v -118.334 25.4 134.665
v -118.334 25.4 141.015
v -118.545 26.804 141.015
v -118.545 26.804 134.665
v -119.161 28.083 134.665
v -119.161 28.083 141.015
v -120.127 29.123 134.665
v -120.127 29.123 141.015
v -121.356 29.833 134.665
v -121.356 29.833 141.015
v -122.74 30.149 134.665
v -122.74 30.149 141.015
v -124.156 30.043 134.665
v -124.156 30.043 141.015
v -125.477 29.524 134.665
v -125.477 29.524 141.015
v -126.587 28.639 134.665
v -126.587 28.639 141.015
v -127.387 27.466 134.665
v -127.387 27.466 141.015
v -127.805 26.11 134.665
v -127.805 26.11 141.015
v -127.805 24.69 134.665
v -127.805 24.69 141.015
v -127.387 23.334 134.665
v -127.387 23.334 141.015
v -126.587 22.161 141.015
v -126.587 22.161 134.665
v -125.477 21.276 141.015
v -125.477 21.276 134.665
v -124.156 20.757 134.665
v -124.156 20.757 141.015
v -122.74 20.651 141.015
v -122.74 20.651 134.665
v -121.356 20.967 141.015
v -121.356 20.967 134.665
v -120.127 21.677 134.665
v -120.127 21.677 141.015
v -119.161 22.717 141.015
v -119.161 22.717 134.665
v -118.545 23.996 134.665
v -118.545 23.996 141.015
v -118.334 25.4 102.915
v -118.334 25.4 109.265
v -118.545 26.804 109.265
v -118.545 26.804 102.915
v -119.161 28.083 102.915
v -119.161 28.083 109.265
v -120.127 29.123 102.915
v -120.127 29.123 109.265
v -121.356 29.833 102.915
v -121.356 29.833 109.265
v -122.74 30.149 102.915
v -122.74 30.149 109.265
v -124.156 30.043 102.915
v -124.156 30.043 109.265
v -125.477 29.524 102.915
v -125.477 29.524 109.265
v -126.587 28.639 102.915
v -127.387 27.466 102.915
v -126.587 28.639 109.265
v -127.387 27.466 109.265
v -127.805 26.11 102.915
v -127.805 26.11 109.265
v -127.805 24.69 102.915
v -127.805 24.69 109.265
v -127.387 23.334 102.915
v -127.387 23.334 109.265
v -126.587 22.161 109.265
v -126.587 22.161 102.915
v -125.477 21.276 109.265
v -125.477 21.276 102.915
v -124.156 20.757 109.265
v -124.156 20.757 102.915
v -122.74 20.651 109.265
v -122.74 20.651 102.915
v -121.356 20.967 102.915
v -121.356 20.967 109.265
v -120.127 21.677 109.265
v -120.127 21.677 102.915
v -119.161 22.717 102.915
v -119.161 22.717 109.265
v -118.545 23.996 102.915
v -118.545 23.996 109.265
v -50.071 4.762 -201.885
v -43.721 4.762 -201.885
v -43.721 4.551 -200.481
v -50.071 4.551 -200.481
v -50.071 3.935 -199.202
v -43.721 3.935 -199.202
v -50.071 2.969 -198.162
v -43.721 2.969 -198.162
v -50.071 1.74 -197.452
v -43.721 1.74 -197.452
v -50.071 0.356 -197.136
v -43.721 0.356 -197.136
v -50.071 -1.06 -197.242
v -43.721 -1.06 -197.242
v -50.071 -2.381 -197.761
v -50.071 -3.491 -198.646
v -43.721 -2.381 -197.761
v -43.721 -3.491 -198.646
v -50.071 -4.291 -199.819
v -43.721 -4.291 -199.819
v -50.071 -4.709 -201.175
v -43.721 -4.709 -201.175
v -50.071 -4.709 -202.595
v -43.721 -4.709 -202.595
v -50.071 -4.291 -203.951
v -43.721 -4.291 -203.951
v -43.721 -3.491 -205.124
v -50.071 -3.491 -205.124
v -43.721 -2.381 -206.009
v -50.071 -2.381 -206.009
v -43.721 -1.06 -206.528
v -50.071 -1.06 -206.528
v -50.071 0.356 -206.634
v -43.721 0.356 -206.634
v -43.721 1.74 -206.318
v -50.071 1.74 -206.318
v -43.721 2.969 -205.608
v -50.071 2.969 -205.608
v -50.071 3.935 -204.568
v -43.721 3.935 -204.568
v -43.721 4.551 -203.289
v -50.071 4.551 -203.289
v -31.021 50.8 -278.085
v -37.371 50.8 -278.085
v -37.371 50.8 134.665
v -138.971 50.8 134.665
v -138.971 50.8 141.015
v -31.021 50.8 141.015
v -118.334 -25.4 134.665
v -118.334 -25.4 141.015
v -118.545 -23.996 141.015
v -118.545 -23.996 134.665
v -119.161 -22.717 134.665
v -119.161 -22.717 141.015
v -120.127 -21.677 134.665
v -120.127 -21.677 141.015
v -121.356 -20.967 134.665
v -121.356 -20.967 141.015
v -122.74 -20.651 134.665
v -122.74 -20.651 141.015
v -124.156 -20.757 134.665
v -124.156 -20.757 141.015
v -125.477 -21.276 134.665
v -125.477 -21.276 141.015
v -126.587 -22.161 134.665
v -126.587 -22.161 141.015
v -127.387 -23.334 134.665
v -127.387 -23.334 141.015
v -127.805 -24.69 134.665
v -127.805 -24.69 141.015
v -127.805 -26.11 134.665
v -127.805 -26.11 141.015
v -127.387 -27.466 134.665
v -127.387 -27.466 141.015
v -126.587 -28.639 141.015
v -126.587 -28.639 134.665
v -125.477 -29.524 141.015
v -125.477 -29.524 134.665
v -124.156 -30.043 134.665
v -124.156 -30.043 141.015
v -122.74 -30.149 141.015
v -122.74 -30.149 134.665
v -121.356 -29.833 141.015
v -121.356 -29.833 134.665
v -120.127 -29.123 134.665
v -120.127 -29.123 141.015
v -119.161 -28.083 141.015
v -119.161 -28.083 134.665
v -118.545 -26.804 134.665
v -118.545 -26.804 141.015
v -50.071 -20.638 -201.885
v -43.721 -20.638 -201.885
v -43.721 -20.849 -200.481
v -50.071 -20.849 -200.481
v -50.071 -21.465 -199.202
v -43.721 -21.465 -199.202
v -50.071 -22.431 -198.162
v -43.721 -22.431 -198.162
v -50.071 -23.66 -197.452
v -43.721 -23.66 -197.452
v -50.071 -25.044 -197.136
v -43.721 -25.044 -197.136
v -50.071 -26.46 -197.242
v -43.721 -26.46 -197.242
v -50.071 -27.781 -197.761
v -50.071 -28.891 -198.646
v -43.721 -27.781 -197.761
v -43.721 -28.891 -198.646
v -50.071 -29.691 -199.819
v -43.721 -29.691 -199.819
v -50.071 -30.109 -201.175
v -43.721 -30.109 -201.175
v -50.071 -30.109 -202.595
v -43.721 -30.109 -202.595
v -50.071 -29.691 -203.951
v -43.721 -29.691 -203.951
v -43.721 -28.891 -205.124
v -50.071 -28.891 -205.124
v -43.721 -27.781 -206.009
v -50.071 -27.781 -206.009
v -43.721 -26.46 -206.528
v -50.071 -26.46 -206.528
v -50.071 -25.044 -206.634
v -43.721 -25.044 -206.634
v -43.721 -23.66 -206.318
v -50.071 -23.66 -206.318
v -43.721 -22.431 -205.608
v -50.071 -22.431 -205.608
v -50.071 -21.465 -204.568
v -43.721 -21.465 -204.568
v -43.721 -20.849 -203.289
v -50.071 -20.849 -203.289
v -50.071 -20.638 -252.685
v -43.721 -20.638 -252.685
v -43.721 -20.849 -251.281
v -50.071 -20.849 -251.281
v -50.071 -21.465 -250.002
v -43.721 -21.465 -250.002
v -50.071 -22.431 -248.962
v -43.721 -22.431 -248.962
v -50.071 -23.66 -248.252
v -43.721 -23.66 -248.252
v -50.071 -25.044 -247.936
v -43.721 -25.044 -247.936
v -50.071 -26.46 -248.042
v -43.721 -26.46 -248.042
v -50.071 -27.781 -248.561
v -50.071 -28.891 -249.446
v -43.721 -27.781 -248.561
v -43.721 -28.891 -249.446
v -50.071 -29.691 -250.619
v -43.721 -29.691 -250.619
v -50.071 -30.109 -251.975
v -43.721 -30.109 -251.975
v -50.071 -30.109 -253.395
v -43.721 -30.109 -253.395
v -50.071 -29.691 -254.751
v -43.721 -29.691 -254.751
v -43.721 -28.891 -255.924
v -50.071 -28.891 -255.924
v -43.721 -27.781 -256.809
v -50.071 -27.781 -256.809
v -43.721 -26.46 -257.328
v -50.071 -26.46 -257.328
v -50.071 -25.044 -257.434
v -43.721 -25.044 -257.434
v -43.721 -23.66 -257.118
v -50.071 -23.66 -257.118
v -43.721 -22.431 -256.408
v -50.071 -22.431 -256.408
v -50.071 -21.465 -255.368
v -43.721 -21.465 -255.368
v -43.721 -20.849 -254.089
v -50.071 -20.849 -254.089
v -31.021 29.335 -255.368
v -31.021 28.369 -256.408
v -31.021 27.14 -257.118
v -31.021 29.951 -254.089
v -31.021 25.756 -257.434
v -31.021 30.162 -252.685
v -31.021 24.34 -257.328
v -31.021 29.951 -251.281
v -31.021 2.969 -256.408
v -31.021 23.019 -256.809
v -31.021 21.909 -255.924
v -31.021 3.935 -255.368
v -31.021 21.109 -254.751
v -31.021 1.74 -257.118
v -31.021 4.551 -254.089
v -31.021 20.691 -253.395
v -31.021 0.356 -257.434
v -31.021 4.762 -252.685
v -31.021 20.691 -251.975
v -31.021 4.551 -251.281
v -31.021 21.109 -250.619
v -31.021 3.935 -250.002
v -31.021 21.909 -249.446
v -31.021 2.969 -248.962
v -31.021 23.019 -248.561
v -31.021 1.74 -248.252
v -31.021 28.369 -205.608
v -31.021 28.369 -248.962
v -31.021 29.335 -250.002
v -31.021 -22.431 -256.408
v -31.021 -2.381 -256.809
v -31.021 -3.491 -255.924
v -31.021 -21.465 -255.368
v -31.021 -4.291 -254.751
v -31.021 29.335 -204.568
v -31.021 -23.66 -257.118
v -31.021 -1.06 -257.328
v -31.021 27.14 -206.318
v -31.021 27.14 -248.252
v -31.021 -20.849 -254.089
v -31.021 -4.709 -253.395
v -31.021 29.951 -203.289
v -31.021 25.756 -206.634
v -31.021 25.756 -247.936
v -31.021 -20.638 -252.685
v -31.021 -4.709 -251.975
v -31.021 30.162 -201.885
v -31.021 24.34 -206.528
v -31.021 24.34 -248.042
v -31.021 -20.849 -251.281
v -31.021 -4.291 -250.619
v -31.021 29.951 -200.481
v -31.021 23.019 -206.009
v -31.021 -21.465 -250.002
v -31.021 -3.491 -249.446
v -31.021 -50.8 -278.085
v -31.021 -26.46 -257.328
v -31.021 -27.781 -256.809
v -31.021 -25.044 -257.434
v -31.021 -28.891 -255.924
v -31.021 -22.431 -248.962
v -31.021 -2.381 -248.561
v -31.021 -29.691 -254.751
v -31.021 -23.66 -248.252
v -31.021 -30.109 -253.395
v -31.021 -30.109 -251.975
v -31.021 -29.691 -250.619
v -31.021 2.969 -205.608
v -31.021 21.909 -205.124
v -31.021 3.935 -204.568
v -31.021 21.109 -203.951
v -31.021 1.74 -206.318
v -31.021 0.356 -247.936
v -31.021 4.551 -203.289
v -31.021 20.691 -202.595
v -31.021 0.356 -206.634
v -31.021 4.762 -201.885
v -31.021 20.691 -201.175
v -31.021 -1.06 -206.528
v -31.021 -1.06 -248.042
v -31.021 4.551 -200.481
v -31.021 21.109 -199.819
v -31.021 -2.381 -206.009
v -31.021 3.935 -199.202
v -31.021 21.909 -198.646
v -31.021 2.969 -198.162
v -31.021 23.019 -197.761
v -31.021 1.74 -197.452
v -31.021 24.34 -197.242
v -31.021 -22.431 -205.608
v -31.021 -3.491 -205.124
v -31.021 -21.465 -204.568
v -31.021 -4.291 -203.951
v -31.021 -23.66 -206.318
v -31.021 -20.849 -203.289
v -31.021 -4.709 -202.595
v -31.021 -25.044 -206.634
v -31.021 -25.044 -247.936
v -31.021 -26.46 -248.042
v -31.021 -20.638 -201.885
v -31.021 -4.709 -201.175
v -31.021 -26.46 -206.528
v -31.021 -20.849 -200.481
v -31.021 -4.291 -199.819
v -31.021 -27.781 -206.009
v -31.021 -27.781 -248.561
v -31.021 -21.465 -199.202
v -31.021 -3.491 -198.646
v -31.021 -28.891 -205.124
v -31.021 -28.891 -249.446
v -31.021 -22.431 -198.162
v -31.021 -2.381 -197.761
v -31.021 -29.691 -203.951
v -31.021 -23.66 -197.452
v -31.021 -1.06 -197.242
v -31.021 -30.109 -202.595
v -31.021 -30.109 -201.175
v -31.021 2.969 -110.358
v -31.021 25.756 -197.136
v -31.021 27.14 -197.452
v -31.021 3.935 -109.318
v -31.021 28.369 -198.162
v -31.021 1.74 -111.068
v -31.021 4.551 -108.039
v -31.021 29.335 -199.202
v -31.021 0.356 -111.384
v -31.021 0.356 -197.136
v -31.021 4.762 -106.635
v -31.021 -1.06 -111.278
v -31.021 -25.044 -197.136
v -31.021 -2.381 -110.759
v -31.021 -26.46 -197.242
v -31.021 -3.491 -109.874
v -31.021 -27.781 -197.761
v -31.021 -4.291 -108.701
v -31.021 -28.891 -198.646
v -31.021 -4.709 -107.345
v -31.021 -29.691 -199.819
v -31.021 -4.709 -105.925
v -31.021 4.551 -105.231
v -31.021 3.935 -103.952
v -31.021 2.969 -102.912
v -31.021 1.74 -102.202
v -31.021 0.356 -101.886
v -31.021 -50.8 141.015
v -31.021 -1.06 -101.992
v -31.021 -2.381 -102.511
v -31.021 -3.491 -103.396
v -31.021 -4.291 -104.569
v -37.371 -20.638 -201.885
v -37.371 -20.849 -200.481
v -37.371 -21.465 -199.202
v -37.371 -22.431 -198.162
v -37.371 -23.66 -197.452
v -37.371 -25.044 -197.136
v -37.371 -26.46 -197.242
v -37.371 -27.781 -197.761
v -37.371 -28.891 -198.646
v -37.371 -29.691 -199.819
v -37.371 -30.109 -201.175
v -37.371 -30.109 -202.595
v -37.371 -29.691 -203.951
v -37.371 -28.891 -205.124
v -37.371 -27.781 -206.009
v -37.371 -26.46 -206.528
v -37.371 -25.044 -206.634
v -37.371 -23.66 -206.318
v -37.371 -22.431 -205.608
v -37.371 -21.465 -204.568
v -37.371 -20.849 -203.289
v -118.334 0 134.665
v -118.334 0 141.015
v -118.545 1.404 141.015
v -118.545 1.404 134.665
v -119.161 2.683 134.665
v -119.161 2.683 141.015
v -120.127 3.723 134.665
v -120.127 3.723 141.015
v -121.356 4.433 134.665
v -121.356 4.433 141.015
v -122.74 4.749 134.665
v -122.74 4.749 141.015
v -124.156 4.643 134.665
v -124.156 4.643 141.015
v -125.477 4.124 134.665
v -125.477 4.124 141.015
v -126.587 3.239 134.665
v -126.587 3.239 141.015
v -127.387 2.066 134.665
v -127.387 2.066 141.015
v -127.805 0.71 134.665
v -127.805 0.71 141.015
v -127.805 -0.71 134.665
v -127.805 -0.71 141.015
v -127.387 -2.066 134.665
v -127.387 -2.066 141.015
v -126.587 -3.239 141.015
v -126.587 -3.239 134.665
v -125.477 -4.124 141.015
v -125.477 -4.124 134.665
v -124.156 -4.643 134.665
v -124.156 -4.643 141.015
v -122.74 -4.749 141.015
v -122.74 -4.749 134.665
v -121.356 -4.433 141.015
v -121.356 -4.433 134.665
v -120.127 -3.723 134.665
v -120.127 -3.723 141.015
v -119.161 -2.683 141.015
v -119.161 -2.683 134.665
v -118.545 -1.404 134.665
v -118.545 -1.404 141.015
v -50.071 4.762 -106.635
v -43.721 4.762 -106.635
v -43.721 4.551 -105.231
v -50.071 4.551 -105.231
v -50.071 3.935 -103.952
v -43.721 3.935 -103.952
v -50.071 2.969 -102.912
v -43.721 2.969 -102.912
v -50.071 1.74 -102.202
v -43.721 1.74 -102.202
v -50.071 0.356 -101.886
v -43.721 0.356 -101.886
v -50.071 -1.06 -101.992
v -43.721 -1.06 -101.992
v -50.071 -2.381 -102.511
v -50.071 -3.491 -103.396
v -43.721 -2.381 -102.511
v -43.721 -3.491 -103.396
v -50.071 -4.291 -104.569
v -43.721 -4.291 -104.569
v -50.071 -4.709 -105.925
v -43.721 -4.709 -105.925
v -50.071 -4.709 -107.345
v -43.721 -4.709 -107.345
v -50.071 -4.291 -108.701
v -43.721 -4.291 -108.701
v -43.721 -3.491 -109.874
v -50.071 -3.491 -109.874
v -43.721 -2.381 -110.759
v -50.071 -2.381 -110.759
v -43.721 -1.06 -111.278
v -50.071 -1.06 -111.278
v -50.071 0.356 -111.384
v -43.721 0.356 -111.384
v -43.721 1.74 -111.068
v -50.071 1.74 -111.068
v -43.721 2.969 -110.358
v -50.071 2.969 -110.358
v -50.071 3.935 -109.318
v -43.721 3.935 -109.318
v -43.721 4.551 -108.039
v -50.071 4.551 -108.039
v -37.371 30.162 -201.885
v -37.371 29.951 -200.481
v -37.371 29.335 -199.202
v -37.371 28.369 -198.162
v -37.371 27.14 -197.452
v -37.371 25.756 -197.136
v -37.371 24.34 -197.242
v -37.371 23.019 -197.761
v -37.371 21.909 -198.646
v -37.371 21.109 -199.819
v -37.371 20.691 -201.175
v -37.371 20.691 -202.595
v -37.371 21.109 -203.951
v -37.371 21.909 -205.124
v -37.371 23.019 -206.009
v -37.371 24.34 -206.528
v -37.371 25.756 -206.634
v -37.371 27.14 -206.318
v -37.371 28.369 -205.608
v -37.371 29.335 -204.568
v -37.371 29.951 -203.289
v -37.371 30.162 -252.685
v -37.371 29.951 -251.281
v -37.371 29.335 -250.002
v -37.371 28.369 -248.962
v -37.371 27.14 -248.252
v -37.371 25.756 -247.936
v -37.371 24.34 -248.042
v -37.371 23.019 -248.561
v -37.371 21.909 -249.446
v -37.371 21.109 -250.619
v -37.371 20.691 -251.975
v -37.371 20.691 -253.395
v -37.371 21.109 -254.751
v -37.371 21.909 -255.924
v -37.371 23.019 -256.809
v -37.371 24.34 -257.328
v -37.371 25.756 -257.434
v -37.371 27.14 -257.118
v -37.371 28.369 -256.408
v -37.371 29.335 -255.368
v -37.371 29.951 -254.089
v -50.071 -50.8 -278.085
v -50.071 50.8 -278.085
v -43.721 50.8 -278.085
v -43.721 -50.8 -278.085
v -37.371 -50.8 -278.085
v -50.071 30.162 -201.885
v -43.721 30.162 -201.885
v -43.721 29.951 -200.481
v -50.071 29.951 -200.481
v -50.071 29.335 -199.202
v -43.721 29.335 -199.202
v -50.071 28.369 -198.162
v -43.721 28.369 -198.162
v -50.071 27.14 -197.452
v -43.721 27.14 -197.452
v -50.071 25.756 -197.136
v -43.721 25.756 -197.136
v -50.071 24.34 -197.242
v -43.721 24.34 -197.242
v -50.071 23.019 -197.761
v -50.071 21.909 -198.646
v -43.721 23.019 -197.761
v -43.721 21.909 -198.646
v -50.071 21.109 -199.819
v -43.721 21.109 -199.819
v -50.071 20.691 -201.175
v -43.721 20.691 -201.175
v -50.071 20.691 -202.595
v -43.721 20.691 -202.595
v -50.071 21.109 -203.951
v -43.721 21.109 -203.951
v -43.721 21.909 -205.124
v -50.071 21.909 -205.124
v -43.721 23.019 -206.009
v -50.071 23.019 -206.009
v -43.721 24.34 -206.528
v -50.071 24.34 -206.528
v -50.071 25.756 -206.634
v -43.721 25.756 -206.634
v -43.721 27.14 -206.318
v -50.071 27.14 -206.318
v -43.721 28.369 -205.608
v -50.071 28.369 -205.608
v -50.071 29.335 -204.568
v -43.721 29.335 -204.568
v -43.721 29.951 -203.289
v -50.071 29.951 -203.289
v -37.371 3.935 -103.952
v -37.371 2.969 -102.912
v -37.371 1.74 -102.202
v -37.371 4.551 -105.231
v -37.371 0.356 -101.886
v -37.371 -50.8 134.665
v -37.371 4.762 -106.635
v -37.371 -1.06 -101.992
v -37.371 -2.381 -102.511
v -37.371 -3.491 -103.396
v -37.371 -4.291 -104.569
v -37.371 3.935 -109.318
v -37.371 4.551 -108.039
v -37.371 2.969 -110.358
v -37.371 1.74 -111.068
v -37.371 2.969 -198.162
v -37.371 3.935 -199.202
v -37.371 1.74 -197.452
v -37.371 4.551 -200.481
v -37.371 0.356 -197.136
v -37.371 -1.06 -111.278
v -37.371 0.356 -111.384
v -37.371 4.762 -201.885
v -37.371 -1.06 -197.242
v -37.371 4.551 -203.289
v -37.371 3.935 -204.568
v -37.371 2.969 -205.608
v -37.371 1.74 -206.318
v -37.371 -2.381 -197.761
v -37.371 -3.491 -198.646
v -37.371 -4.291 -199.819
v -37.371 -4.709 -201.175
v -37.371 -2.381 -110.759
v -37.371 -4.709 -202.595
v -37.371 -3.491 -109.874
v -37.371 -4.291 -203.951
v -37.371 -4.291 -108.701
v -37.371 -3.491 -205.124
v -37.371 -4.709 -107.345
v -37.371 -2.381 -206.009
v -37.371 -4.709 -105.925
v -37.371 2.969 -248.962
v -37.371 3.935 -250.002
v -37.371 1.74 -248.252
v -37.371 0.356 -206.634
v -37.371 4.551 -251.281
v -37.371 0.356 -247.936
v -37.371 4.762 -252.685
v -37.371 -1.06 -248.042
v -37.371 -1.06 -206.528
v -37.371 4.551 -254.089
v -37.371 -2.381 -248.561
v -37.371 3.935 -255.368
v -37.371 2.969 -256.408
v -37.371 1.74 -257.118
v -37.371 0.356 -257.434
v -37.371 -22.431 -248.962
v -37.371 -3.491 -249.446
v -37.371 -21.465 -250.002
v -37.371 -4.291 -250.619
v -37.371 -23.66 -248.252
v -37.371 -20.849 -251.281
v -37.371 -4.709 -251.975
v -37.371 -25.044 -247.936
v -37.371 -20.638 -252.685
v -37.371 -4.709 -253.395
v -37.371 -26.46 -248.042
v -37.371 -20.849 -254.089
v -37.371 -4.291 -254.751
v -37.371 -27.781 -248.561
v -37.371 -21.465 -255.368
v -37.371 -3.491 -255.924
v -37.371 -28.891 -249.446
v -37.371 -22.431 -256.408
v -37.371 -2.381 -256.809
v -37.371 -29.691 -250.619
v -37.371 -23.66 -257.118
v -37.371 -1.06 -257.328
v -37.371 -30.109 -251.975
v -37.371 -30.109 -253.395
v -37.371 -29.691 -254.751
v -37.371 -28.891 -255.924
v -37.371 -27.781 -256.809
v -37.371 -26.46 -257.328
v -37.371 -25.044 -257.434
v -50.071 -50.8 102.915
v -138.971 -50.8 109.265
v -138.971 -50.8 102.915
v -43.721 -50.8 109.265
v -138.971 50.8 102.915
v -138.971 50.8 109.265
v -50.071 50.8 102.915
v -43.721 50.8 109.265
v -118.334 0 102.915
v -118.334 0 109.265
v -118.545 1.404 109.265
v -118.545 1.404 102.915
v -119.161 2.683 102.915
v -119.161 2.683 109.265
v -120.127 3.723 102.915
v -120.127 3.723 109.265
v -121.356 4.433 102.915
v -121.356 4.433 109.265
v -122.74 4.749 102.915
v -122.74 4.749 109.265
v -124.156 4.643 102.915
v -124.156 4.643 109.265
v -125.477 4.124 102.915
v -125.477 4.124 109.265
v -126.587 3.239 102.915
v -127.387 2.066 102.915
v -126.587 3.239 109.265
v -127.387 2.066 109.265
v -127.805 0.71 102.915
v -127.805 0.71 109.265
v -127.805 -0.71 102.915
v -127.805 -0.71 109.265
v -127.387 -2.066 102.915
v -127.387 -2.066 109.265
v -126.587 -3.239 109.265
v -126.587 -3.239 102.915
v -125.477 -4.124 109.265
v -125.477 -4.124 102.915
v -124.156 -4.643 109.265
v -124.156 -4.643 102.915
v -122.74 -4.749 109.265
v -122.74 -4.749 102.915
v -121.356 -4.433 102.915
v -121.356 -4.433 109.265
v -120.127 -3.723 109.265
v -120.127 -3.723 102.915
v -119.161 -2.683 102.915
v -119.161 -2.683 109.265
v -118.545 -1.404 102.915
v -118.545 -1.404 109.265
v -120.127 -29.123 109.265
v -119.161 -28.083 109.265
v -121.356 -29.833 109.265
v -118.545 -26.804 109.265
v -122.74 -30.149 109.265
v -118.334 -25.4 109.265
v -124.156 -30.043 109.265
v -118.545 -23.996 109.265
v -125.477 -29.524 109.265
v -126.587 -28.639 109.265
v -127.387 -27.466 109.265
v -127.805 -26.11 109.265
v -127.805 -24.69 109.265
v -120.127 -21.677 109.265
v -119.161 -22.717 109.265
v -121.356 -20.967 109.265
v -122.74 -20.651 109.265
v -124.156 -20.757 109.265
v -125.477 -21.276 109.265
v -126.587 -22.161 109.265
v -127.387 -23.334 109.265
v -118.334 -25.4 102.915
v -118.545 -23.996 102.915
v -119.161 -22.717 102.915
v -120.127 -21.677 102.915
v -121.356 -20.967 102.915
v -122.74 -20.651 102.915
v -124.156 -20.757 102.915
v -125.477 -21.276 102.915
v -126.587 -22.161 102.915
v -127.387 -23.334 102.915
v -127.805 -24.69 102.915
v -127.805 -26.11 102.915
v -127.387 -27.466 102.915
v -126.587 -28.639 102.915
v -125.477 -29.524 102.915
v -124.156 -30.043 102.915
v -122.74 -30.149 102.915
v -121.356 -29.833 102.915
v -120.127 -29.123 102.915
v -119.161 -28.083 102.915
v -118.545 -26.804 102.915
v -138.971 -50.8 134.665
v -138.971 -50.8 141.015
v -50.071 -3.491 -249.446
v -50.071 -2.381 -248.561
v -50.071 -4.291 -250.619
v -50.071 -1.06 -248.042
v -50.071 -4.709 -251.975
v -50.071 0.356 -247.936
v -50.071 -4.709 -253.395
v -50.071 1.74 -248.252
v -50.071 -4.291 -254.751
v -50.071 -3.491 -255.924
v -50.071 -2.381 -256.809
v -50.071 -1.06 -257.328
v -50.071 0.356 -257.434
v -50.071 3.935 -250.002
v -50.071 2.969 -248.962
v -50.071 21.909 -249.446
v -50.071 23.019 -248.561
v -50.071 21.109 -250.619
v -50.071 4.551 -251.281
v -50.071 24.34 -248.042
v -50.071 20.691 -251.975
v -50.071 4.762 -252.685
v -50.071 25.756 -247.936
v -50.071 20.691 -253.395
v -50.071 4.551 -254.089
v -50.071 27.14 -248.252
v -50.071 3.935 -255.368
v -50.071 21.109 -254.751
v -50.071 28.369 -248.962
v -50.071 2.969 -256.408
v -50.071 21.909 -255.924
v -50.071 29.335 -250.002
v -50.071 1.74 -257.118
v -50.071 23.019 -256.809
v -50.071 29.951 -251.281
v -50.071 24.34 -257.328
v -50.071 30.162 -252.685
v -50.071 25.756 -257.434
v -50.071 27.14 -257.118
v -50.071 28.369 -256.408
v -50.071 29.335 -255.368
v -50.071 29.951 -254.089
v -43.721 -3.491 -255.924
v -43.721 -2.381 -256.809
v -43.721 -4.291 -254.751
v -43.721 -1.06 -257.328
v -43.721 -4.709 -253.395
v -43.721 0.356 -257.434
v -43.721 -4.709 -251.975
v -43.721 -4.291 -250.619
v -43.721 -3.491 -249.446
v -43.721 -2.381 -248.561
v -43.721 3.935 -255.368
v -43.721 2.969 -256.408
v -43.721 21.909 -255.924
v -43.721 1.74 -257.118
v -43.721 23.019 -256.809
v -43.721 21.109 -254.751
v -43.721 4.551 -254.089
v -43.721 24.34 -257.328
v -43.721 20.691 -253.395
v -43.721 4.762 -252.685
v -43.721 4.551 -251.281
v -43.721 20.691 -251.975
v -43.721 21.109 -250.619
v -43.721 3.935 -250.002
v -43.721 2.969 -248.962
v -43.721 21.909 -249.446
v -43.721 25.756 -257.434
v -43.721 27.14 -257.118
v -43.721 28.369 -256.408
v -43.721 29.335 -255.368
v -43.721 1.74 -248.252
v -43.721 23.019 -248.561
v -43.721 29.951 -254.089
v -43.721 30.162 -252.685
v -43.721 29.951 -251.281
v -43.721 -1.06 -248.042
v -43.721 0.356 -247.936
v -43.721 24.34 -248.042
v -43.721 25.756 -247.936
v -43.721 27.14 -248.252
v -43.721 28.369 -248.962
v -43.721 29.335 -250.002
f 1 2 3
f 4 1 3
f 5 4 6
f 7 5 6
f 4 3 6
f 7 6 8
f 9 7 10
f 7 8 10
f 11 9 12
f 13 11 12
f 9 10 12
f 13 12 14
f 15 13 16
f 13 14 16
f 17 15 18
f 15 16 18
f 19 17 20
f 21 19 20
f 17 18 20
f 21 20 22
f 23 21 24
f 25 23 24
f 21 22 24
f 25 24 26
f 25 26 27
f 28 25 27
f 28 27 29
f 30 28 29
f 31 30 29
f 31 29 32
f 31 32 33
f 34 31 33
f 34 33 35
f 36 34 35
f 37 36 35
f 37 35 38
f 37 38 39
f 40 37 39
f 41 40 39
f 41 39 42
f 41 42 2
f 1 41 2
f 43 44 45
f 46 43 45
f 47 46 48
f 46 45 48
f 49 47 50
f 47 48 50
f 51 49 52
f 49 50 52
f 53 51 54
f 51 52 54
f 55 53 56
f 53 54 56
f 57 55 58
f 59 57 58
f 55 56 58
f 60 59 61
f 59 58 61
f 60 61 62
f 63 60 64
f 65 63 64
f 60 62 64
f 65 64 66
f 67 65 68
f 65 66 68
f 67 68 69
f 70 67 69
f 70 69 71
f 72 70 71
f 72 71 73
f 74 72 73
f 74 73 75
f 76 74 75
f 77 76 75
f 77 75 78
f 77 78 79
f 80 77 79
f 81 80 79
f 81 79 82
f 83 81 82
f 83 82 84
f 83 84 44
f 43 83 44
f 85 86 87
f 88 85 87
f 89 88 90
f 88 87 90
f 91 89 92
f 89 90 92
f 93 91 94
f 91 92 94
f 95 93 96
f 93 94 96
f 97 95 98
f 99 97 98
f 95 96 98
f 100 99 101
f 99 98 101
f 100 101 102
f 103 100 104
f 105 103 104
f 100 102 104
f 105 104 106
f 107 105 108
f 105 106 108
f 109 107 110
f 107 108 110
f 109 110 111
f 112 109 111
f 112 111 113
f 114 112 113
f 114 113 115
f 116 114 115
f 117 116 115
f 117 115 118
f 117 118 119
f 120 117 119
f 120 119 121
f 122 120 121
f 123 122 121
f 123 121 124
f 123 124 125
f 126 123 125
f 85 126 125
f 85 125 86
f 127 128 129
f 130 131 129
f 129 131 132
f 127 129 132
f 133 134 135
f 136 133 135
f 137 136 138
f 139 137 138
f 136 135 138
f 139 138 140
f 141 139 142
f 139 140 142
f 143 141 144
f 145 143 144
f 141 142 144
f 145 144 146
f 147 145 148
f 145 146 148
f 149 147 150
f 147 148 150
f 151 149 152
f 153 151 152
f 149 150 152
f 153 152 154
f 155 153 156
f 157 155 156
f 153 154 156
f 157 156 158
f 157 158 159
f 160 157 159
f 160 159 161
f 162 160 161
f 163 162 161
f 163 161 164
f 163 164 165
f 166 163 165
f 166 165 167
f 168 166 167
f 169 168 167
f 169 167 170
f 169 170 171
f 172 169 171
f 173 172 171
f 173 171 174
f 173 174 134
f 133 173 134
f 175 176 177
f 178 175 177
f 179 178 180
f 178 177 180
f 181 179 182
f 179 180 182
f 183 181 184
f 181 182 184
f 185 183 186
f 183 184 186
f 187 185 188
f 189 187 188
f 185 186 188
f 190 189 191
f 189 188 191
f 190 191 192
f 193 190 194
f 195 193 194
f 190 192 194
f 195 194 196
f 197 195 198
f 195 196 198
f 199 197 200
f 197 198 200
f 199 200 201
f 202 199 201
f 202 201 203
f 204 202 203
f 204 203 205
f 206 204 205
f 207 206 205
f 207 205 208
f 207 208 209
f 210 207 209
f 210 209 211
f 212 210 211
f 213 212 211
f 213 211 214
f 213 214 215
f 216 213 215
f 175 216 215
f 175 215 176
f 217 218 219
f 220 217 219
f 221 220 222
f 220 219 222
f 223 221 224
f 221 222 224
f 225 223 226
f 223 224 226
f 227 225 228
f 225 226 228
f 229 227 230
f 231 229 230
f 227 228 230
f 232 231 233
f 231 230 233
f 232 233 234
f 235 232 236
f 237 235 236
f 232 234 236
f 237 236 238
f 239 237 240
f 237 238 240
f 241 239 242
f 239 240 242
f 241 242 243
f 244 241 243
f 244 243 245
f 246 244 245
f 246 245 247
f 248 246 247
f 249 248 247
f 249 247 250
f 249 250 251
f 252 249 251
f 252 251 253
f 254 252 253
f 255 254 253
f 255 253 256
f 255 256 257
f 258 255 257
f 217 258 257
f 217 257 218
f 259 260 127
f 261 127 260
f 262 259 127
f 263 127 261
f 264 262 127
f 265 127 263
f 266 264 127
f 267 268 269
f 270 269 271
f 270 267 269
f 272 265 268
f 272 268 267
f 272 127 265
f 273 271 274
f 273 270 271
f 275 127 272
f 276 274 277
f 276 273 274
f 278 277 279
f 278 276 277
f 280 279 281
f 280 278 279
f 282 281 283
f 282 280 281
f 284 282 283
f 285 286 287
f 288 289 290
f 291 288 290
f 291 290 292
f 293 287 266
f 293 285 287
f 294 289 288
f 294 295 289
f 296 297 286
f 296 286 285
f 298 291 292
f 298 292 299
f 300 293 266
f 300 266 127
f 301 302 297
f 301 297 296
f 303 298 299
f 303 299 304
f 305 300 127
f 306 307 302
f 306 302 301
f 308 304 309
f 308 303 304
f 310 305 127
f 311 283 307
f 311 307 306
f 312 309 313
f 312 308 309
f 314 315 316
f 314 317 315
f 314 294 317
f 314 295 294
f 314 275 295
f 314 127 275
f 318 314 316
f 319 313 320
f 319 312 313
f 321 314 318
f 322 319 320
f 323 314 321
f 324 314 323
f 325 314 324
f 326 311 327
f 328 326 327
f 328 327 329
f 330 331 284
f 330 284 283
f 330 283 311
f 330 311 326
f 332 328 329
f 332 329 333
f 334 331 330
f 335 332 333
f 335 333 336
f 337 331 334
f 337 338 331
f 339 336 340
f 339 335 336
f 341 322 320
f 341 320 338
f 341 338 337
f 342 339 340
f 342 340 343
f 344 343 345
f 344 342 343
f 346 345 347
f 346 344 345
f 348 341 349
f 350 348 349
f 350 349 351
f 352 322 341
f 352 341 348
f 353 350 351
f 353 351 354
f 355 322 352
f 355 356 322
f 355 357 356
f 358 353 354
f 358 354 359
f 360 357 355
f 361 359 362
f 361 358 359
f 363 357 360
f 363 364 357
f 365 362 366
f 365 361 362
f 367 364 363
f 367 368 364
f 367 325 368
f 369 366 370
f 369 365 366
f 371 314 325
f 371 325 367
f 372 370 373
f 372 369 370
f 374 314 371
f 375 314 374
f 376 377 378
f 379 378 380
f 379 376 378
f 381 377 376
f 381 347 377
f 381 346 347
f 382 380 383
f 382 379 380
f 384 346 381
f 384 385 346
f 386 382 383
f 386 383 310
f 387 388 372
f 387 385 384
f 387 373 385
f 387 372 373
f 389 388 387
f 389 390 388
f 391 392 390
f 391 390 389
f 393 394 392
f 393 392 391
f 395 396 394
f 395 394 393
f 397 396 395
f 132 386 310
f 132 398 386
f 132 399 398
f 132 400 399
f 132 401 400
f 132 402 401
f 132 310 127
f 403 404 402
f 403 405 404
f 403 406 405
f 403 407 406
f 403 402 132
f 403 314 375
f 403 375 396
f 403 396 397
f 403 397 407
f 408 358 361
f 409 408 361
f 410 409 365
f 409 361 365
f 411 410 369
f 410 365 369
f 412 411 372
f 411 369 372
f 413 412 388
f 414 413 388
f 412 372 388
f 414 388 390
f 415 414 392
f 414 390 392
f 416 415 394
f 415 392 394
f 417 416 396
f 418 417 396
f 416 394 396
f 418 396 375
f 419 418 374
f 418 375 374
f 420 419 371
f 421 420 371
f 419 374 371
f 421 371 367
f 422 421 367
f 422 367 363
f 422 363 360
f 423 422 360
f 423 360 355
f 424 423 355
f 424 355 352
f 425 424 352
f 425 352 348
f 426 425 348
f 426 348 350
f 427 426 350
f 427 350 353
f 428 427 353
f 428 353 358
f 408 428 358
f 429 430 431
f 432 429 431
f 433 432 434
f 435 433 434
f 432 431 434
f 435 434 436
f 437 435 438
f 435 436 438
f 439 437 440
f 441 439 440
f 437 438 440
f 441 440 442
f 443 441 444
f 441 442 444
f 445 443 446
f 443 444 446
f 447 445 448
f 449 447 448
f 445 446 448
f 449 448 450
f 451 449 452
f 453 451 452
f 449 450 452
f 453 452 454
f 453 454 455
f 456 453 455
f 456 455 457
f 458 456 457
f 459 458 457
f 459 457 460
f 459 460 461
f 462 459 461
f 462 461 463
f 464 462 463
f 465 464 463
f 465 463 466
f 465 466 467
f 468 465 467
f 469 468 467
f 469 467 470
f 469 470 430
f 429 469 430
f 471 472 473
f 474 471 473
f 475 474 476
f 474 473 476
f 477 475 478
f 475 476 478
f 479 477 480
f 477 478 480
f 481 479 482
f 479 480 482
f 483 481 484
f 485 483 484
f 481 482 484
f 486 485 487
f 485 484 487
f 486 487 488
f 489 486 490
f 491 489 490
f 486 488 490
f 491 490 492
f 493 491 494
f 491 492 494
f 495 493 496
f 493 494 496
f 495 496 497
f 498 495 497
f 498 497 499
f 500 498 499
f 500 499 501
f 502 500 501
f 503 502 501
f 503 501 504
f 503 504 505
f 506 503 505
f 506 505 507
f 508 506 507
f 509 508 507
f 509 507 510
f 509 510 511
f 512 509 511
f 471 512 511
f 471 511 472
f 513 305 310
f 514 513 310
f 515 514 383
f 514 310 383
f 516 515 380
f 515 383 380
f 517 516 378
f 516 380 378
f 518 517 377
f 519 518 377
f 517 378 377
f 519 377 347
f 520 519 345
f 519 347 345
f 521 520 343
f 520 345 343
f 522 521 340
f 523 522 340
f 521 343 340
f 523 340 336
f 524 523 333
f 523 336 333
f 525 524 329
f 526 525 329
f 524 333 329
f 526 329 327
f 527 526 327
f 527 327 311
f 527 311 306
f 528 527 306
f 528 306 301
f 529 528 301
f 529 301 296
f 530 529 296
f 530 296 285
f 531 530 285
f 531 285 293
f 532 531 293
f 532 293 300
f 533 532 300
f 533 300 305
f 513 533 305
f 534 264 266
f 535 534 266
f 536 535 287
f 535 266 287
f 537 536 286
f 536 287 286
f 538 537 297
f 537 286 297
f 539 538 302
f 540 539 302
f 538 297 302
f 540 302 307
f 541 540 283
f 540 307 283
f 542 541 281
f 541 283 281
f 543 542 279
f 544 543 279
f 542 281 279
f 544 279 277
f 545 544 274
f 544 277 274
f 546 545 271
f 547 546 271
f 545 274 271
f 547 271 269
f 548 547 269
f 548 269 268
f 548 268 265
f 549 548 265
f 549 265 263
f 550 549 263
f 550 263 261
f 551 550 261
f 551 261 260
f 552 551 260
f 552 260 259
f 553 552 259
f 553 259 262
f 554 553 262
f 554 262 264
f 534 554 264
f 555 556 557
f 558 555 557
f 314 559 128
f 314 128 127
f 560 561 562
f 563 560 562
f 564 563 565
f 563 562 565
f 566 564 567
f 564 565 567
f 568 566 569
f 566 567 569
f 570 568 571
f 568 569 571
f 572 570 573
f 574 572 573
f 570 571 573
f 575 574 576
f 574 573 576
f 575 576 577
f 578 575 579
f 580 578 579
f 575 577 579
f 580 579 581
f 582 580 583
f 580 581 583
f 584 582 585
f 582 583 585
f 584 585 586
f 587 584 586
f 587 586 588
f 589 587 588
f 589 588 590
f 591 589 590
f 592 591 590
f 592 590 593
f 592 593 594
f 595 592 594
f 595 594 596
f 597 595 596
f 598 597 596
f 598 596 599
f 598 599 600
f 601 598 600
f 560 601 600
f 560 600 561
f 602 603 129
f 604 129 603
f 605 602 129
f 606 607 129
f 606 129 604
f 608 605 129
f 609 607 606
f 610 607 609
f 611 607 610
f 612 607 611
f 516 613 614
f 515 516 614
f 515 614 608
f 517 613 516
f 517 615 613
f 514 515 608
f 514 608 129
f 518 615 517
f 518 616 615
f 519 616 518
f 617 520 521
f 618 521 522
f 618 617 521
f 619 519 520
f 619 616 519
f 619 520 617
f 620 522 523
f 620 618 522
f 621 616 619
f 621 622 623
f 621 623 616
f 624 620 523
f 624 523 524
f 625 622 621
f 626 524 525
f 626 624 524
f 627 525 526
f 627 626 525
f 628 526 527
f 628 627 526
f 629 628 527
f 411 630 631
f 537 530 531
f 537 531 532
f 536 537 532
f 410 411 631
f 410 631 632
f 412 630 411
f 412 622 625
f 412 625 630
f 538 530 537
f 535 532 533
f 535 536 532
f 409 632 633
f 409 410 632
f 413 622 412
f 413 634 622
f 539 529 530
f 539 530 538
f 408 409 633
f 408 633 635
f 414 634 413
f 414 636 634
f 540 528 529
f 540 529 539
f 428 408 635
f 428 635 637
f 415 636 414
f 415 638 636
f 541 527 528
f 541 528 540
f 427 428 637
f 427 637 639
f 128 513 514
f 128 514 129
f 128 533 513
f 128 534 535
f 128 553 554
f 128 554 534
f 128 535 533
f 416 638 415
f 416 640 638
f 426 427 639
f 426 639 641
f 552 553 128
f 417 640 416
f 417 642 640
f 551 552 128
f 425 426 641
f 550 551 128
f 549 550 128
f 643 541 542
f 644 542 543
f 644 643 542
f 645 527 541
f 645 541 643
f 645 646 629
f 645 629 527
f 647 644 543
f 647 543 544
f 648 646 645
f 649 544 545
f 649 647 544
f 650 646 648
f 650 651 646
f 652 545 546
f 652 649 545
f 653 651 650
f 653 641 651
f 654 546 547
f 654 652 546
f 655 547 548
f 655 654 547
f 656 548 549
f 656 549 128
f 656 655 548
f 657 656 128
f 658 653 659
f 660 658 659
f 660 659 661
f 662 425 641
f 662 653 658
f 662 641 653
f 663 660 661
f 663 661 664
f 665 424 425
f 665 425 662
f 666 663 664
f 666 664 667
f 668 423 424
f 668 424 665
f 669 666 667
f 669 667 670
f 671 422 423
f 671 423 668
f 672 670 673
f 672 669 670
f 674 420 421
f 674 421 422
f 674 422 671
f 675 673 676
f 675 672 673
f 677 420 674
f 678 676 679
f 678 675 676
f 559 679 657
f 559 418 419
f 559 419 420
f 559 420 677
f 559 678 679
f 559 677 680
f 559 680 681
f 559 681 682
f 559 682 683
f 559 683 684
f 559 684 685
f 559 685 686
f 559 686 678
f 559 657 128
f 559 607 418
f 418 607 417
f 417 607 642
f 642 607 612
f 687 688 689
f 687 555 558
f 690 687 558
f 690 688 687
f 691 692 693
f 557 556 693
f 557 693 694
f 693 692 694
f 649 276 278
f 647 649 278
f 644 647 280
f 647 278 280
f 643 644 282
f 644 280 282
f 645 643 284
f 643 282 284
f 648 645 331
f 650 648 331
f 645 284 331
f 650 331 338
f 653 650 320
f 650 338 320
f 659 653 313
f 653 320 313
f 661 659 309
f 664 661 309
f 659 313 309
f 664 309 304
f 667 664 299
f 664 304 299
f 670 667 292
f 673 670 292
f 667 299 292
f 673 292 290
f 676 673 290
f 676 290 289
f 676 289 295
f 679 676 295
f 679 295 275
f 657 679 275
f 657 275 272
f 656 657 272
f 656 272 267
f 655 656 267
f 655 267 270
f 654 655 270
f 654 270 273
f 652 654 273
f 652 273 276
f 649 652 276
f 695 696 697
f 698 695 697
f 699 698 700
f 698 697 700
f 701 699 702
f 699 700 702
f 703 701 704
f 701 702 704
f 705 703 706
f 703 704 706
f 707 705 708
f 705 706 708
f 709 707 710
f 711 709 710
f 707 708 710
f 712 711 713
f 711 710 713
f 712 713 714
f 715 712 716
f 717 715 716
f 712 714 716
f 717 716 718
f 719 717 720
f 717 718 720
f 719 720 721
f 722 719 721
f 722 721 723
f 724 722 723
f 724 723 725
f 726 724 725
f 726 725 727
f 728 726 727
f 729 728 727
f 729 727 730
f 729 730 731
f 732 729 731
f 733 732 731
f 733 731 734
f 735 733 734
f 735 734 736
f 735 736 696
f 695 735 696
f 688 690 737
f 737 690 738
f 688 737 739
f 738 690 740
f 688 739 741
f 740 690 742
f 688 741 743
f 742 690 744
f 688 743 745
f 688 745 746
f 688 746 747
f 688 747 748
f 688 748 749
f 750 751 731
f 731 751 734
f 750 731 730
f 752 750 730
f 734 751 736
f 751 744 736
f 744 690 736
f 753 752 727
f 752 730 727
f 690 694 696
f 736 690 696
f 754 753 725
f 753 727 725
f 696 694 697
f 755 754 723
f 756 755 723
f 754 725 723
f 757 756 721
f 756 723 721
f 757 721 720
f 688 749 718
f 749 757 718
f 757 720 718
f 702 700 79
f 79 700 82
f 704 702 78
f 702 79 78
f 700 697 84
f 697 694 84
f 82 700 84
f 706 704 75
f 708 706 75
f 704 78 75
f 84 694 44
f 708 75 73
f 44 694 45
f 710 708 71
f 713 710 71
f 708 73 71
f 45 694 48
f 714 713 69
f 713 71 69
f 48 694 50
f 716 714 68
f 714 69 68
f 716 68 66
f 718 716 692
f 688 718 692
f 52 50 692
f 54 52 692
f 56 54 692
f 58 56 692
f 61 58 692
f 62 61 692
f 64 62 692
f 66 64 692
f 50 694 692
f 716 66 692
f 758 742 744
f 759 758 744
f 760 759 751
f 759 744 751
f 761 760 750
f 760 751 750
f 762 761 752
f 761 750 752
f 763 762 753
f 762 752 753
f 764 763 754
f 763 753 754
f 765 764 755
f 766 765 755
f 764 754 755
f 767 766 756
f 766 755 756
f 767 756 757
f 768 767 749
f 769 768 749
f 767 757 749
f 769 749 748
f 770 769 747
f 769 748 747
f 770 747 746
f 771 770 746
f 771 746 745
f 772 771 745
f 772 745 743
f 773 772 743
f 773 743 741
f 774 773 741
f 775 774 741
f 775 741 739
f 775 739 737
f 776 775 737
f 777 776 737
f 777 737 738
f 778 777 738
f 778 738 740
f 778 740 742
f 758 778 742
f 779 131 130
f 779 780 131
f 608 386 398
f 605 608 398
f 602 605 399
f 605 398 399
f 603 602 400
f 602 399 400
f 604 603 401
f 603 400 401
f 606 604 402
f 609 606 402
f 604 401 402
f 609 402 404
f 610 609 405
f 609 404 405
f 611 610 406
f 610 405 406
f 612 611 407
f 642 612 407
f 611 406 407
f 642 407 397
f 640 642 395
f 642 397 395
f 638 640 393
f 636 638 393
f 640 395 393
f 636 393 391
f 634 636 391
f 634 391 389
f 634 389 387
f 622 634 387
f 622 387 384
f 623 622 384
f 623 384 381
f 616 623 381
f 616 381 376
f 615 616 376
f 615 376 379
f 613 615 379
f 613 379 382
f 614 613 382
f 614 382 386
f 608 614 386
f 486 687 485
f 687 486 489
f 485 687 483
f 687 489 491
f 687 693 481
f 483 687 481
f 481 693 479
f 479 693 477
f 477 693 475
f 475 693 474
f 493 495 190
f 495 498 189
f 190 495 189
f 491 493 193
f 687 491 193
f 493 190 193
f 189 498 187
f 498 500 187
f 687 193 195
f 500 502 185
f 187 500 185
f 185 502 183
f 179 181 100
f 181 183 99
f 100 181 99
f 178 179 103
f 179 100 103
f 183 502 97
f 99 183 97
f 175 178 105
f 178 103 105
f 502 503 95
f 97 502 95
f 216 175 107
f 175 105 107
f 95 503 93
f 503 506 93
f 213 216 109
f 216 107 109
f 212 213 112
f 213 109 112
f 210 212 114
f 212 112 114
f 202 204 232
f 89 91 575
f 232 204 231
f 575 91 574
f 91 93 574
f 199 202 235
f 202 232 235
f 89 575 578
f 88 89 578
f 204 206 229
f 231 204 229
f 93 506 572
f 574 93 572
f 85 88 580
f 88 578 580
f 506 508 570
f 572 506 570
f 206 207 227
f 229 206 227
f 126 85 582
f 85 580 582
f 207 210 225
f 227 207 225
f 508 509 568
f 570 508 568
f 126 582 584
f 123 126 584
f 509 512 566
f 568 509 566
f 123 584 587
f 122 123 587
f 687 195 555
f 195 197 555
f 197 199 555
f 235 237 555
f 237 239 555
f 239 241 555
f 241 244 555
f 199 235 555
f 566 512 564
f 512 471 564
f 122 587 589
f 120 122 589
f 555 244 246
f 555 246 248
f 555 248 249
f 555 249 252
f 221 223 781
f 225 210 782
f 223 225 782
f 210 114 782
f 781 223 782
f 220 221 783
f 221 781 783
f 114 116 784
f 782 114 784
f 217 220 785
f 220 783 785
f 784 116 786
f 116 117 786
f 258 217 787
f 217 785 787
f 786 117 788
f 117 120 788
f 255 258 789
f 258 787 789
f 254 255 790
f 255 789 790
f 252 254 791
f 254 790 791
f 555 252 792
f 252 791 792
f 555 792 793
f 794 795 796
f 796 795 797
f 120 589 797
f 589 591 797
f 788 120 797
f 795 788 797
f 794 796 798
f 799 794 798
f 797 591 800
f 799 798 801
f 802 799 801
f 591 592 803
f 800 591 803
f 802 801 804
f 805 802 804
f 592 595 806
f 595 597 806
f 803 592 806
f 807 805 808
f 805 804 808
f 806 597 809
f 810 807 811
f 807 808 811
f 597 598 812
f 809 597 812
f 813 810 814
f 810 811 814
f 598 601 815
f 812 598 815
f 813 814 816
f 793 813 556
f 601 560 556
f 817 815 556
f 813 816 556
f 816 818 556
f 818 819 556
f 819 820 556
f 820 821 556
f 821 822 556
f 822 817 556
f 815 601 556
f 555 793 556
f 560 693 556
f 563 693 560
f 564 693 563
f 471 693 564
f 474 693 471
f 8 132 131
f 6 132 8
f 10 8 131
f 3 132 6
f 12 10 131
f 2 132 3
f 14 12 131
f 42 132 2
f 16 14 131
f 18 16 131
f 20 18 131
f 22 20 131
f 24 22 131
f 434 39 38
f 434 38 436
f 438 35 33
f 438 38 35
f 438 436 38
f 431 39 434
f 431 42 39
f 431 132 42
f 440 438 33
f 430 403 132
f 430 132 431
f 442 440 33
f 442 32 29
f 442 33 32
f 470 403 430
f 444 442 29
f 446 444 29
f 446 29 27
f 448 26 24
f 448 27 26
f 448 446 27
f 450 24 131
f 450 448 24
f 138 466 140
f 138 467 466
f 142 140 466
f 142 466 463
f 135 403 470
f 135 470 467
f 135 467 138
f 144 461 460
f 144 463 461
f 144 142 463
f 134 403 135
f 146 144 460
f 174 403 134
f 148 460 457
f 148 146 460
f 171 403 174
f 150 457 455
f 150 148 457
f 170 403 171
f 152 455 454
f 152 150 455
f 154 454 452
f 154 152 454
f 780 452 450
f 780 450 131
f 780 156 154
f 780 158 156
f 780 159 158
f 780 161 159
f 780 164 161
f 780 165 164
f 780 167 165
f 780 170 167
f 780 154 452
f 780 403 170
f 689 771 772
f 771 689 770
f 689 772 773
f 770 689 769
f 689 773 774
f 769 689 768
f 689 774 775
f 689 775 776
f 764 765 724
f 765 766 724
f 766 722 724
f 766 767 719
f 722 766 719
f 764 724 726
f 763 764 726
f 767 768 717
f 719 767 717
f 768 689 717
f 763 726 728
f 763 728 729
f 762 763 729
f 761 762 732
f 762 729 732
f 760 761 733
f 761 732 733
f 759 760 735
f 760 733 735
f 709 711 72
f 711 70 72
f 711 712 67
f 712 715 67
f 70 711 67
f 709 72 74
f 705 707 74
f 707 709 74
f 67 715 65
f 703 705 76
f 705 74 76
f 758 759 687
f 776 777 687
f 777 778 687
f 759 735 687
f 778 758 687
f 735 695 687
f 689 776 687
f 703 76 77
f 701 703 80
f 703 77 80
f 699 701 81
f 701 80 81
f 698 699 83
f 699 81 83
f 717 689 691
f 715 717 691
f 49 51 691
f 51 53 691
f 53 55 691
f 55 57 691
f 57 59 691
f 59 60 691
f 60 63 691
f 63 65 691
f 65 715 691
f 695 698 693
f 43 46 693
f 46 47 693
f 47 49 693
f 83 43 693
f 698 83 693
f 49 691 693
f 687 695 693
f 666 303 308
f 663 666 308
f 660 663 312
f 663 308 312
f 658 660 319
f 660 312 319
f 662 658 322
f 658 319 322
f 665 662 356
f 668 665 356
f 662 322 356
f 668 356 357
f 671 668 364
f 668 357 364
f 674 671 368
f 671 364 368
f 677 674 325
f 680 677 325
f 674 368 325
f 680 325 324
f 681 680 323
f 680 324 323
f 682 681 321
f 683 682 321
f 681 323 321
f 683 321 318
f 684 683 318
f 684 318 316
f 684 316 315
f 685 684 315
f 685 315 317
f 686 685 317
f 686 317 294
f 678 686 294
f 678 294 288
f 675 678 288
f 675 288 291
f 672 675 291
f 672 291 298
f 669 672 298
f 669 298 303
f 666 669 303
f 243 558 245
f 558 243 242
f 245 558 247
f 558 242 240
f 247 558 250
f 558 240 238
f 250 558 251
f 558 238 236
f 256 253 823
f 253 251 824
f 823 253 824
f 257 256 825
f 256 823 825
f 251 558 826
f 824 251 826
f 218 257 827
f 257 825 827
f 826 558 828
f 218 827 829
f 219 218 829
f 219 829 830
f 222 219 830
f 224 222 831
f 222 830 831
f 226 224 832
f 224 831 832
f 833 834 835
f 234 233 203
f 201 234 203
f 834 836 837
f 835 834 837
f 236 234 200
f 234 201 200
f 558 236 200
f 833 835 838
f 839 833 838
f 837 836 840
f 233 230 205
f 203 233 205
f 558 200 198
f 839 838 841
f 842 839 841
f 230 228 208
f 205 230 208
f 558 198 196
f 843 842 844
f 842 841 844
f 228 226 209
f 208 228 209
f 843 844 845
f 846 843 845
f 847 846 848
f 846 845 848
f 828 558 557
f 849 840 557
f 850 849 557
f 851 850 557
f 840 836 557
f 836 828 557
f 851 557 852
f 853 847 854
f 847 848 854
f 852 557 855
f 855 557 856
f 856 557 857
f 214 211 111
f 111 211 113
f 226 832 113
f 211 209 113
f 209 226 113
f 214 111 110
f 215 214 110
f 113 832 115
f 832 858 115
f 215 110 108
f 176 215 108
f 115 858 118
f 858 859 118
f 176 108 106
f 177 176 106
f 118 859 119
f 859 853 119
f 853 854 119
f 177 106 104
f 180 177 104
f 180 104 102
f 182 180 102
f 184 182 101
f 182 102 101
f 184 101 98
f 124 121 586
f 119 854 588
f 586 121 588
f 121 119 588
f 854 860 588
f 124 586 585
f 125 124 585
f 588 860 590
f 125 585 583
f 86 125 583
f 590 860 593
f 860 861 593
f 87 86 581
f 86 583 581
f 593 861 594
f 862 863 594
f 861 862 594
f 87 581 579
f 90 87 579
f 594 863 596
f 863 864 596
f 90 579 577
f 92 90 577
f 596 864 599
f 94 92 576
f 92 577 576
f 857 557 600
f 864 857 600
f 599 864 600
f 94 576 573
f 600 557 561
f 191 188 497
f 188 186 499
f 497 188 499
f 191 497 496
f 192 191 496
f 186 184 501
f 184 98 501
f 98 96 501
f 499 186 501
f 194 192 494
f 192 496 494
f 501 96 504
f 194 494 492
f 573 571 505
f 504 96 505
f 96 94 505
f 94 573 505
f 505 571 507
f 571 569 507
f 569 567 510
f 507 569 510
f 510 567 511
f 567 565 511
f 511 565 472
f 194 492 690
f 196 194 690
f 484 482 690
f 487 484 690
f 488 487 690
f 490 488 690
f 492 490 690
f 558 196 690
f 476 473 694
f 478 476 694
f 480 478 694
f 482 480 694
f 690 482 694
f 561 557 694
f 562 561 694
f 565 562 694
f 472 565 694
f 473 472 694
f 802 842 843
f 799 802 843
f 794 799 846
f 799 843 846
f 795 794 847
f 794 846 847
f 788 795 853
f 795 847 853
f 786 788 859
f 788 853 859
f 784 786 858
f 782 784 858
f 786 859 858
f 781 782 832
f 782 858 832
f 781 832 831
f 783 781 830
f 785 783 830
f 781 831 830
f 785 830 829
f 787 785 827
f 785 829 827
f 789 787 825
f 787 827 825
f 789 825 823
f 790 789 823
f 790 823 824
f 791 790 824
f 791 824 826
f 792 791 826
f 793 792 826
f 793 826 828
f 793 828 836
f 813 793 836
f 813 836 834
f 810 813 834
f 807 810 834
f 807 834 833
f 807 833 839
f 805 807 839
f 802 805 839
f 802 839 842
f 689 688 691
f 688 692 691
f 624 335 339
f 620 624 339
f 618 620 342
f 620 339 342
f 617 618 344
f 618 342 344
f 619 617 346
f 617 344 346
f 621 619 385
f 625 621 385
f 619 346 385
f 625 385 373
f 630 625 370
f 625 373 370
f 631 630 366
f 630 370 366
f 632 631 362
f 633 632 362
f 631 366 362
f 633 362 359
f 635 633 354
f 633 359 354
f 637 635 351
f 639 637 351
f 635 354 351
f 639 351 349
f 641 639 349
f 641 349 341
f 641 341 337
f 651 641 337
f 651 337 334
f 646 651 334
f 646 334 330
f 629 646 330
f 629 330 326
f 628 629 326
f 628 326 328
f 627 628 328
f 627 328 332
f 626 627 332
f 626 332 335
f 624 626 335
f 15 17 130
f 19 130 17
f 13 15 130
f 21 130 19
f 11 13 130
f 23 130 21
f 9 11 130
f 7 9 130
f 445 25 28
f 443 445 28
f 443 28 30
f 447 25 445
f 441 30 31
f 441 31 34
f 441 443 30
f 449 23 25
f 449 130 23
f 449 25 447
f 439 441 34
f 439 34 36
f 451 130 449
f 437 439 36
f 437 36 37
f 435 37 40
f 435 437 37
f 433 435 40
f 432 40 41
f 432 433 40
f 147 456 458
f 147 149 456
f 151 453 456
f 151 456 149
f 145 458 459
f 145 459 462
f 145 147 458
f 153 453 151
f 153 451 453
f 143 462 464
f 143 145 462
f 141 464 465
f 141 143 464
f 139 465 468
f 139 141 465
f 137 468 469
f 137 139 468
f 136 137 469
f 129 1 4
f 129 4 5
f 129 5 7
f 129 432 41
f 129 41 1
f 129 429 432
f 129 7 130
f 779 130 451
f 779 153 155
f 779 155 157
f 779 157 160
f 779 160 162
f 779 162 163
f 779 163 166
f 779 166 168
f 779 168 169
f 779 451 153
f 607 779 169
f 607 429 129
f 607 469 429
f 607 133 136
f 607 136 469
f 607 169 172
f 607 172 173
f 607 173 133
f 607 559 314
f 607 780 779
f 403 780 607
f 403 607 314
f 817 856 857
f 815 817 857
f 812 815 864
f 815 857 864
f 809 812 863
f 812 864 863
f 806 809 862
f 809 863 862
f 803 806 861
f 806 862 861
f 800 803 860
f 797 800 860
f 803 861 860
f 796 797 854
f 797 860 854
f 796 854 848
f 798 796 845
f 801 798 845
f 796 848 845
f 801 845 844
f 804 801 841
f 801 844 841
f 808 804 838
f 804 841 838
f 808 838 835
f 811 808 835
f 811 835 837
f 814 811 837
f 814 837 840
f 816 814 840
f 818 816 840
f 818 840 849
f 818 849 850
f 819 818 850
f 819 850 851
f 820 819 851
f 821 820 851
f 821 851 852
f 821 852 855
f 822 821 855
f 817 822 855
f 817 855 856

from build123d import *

# Parameters (mm, degrees)
F1_DEPTH = 50.8
F2_R     = 4.7625
F3_DEPTH = 107.951
F4_R     = 4.7625
F5_DEPTH = 419.101


with BuildPart() as f1:
    # F0 (on Front) → F1 (new body, symmetric)
    with BuildSketch(Plane.XZ):
        Polygon((-43.721065, 109.265013), (-138.971065, 109.265013), (-138.971065, 102.915013), (-50.071065, 102.915013), (-50.071065, -278.084987), (-43.721065, -278.084987), align=None)
        Polygon((-138.971065, 134.665013), (-37.371065, 134.665013), (-37.371065, -278.084987), (-31.021065, -278.084987), (-31.021065, 141.015013), (-138.971065, 141.015013), align=None)
    extrude(amount=F1_DEPTH, both=True)

    # F2 (on face) → F3 (cut, through all)
    with BuildSketch(Plane.YZ.offset(-31.021065)):
        with Locations((-25.4, -252.684987)):
            Circle(F2_R)
        with Locations((-25.4, -201.884987)):
            Circle(F2_R)
        with Locations((0, -252.684987)):
            Circle(F2_R)
        with Locations((0, -201.884987)):
            Circle(F2_R)
        with Locations((25.4, -252.684987)):
            Circle(F2_R)
        with Locations((25.4, -201.884987)):
            Circle(F2_R)
        with Locations((0, -106.634987)):
            Circle(F2_R)
    extrude(amount=-F3_DEPTH, mode=Mode.SUBTRACT)

    # F4 (on face) → F5 (cut, through all)
    with BuildSketch(Plane.XY.offset(141.015013)):
        with Locations((-123.096065, -25.4)):
            Circle(F4_R)
        with Locations((-123.096065, 0)):
            Circle(F4_R)
        with Locations((-123.096065, 25.4)):
            Circle(F4_R)
    extrude(amount=-F5_DEPTH, mode=Mode.SUBTRACT)


solid = f1.part
